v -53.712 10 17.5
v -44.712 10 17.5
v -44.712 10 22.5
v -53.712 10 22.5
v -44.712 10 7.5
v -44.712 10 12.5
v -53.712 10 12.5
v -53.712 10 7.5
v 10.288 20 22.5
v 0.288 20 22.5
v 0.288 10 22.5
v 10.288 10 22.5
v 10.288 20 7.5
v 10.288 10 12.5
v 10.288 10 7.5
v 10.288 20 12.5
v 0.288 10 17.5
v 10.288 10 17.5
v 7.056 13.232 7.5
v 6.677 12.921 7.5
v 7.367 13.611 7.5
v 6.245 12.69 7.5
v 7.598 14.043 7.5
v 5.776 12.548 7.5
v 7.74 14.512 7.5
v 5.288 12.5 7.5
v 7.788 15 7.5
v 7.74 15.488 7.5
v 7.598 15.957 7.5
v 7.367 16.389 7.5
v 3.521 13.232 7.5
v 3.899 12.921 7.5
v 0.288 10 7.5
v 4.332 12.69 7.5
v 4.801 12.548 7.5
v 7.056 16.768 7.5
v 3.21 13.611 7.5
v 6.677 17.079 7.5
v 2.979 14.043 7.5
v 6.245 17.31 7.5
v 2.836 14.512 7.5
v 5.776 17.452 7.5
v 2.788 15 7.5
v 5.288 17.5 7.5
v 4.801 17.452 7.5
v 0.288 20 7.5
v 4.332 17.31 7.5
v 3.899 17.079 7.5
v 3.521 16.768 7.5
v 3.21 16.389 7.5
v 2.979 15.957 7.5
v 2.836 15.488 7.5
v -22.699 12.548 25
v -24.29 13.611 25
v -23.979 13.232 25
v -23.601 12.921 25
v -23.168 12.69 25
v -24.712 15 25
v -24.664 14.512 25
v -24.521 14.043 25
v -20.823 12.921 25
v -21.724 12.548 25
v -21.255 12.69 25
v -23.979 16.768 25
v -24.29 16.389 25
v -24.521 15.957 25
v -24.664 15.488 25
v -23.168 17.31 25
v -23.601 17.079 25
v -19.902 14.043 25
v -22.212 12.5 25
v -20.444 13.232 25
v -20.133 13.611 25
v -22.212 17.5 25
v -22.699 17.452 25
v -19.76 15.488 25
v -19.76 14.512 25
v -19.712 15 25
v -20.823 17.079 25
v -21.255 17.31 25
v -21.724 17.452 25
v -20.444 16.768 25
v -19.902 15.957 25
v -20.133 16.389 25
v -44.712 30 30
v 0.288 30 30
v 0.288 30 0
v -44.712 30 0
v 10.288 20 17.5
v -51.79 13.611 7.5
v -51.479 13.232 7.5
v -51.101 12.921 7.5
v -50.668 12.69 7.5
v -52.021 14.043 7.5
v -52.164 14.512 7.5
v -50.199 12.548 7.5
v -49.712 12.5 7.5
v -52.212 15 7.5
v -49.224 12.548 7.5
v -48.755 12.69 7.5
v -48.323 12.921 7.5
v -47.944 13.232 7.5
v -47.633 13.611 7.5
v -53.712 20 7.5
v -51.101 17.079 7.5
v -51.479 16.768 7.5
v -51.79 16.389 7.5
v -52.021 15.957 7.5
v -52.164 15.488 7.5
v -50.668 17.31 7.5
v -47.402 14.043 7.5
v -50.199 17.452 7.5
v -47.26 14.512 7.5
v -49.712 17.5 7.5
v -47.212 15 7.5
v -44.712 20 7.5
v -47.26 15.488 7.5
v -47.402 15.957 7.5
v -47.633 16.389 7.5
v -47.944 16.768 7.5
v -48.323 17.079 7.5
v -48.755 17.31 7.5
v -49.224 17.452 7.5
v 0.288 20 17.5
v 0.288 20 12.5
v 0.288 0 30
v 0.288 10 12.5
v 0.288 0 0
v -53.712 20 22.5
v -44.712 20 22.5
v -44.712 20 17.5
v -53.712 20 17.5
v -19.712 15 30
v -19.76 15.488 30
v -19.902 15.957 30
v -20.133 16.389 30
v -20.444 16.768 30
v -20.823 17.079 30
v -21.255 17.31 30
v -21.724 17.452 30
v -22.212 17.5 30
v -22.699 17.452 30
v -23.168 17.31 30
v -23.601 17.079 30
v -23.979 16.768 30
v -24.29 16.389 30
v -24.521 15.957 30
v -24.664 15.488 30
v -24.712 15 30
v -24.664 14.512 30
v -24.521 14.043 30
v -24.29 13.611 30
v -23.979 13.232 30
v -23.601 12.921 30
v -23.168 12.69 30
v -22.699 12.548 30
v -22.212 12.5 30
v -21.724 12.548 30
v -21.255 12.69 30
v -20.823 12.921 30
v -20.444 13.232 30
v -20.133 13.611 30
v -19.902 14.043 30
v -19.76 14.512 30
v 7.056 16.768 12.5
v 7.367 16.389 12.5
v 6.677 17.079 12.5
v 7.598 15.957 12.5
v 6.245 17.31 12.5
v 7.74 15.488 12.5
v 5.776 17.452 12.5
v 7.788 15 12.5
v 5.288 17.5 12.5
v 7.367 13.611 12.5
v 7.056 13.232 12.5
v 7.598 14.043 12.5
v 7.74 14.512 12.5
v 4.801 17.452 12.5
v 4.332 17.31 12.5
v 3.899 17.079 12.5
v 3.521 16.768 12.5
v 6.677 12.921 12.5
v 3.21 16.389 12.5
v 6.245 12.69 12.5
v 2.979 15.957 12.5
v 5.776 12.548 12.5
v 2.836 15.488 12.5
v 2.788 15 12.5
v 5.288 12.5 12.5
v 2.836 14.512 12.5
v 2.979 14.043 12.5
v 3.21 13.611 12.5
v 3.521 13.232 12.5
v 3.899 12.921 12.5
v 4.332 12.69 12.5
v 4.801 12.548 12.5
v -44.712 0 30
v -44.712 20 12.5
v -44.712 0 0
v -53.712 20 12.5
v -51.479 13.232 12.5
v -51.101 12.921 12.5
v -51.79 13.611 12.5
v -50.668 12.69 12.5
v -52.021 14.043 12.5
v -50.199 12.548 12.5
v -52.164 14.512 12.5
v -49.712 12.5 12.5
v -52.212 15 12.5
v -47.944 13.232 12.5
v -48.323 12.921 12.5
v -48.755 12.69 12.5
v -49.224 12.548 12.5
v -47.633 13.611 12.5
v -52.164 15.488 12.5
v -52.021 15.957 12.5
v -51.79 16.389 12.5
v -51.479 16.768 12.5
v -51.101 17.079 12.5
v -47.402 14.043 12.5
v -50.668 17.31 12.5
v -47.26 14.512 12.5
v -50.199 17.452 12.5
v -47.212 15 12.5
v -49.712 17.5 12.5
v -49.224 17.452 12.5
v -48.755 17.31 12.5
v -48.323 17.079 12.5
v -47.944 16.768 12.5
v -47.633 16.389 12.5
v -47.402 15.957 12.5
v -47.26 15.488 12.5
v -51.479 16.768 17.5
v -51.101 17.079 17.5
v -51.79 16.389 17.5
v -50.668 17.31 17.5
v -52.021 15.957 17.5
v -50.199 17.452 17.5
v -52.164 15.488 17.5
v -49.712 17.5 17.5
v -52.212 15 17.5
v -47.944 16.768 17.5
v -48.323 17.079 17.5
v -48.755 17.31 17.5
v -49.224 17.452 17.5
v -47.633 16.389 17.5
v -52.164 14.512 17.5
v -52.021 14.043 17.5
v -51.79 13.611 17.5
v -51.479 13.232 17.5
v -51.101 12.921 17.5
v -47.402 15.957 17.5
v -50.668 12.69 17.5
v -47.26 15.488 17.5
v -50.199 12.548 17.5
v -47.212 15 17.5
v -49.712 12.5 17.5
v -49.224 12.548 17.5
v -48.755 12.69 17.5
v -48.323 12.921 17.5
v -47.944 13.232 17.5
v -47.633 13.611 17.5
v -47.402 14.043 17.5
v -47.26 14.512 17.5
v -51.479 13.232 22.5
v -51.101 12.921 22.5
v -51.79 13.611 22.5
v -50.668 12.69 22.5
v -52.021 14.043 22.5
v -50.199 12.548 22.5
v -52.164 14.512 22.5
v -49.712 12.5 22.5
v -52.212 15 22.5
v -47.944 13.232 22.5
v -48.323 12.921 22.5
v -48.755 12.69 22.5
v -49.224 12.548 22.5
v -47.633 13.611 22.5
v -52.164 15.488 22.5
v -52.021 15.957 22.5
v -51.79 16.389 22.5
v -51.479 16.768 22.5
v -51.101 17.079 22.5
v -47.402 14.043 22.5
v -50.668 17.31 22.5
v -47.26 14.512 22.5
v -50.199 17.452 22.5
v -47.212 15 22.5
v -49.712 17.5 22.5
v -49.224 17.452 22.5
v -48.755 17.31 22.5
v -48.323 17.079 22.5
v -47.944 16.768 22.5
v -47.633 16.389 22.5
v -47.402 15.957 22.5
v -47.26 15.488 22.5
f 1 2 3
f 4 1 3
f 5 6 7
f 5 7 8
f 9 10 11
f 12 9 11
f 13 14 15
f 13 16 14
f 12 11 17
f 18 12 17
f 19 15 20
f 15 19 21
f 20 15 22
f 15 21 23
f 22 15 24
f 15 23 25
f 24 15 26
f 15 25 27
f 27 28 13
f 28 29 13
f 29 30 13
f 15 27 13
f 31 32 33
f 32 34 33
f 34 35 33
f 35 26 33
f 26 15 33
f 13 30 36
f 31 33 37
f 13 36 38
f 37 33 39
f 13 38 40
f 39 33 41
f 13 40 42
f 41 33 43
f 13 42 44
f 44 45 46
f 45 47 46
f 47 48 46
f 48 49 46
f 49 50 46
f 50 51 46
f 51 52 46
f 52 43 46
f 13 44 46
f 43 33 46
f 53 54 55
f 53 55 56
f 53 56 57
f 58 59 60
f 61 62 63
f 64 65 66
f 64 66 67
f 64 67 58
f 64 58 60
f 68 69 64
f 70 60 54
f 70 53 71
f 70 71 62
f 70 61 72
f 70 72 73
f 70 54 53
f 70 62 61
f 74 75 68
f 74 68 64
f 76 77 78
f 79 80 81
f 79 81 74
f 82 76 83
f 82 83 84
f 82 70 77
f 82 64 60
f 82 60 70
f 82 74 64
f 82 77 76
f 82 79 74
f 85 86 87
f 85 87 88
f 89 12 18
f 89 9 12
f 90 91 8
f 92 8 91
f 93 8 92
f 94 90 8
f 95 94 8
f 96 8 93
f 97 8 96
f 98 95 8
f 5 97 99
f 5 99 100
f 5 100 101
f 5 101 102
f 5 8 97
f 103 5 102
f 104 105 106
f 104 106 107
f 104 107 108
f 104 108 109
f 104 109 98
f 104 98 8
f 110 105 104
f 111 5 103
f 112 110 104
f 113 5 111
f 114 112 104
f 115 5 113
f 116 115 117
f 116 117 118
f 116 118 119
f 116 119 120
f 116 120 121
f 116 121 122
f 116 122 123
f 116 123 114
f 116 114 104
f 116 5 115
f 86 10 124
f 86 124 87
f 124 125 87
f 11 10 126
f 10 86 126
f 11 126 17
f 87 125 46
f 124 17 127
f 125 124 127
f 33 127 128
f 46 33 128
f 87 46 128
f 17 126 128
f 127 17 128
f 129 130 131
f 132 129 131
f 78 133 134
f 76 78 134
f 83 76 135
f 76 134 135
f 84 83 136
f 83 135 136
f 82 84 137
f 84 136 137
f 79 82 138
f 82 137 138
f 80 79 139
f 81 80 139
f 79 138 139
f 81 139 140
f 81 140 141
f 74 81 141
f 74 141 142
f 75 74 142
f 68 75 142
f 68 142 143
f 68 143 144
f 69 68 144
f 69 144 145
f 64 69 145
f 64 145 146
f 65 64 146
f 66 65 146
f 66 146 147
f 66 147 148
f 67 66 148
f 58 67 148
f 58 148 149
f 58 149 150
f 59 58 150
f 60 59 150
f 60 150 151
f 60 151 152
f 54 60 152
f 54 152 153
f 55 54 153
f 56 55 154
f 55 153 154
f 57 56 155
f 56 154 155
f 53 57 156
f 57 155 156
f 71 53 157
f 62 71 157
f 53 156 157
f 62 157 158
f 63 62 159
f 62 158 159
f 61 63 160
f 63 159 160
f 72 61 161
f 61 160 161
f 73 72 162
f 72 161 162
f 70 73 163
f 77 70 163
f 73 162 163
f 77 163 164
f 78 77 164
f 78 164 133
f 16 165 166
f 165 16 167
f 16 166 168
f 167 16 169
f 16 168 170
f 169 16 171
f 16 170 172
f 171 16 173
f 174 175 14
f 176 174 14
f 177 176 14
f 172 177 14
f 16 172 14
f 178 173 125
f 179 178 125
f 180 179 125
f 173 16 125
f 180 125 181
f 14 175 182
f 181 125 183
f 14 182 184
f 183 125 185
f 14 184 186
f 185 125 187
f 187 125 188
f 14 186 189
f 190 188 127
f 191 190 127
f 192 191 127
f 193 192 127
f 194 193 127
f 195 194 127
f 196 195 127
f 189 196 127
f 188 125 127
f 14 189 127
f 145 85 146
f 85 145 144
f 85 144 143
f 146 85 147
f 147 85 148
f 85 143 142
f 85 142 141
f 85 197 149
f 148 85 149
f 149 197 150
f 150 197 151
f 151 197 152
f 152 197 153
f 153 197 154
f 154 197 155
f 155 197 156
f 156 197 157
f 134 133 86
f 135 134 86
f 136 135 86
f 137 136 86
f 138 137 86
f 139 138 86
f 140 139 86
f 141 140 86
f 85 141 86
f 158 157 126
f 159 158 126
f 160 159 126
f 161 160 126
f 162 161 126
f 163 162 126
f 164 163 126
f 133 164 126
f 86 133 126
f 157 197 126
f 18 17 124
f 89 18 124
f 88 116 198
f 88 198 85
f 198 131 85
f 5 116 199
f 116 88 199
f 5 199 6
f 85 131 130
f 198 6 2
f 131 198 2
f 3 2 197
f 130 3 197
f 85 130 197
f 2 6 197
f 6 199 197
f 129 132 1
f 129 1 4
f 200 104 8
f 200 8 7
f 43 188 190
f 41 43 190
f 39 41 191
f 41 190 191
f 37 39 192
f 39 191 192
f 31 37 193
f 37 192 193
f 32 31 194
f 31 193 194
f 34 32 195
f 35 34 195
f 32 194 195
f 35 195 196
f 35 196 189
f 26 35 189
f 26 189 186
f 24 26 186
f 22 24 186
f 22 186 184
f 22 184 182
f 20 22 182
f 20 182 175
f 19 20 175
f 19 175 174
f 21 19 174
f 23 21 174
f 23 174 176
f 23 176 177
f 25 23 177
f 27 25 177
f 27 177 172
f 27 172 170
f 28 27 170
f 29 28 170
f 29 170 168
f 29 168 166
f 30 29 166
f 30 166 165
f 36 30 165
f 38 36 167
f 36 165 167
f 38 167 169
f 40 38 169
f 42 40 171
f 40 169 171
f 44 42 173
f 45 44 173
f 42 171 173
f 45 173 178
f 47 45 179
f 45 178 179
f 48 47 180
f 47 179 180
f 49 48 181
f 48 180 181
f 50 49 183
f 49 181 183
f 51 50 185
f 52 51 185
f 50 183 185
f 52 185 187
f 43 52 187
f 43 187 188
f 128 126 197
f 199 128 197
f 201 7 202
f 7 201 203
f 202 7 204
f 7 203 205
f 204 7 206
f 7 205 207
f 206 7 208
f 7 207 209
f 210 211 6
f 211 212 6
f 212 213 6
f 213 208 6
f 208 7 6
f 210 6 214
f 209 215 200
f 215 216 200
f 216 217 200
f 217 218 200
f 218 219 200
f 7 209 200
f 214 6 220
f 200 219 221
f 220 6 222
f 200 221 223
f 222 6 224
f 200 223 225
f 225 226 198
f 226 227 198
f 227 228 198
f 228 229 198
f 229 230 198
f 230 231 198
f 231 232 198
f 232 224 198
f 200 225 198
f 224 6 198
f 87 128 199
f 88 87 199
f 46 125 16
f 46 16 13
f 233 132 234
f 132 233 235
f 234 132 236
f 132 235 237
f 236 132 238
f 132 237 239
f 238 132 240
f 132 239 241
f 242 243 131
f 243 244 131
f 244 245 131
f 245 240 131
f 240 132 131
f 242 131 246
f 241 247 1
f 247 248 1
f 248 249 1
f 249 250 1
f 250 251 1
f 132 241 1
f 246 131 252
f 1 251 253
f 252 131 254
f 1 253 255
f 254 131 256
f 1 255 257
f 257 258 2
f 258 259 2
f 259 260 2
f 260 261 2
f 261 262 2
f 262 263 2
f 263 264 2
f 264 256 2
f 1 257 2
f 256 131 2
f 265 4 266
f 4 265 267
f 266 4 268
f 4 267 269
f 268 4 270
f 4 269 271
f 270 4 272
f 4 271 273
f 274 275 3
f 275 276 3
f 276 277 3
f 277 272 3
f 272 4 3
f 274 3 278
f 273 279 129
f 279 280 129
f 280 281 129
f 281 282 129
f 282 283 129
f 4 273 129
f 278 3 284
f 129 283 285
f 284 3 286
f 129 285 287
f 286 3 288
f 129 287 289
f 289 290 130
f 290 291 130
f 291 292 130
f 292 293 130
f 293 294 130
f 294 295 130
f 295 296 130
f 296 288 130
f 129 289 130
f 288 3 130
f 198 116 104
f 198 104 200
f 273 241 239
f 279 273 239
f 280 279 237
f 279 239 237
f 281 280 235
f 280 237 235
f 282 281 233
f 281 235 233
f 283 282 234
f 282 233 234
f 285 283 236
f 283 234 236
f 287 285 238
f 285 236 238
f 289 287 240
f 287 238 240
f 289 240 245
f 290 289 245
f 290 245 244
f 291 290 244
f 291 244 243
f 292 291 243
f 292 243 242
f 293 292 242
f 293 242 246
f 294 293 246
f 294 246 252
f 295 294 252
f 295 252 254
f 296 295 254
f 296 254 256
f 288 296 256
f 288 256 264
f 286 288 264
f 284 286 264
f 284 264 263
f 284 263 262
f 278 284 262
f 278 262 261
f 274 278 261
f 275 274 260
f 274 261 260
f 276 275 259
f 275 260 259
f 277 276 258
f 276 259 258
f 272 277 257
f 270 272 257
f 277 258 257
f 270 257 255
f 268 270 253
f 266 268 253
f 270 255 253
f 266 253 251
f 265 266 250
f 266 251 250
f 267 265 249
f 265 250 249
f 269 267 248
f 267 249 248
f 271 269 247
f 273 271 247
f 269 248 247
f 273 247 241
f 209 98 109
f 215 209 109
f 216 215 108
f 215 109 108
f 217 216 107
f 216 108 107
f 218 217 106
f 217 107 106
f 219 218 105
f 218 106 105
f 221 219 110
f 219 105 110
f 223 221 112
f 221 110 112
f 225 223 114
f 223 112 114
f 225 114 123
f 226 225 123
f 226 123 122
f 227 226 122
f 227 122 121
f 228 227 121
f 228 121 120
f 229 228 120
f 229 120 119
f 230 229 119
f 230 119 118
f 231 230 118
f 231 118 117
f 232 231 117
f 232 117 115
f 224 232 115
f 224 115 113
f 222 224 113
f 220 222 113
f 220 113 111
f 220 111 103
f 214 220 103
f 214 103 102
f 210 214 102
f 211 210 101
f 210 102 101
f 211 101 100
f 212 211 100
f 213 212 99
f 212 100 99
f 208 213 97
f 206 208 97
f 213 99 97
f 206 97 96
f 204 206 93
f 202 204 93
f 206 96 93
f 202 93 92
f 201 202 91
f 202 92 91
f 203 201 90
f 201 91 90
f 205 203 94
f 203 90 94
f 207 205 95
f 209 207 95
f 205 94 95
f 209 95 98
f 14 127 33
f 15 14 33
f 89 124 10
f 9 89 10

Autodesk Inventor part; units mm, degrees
ref_plane "YZ Plane" through (0, 0, 0) normal (1, 0, 0) x (0, 1, 0)
ref_plane "XZ Plane" through (0, 0, 0) normal (0, 1, 0) x (-1, 0, 0)
ref_plane "XY Plane" through (0, 0, 0) normal (0, 0, 1) x (1, 0, 0)
sketch "Sketch1" plane through (0, 0, 0) normal (0, 1, 0) x (-1, 0, 0)
  line L0 (-0.2883, 0) -> (44.7117, 0)
  line L1 (44.7117, 0) -> (44.7117, 30)
  line L2 (44.7117, 30) -> (-0.2883, 30)
  line L3 (-0.2883, 30) -> (-0.2883, 0)
  point P0 (0, 0)
  dimension "d0" = 45
  dimension "d1" = 30
extrude "Extrusion1" add sketch "Sketch1" along normal blind 30
sketch "Sketch2" plane through (-44.7117, 0, 0) normal (-1, 0, 0) x (0, 0, 1)
  line L0 (19.294, 8.1716) -> (10.706, 21.8284) construction
  line L1 (10.706, 8.1716) -> (19.294, 21.8284) construction
  line L2 (17.5, 10) -> (12.5, 10)
  line L3 (12.5, 10) -> (12.5, 20)
  line L4 (12.5, 20) -> (17.5, 20)
  line L5 (17.5, 20) -> (17.5, 10)
  line L6 (17.5, 10) -> (12.5, 20) construction
  line L7 (12.5, 10) -> (17.5, 20) construction
  line L8 (12.5, 10) -> (7.5, 10)
  line L9 (7.5, 10) -> (7.5, 20)
  line L10 (7.5, 20) -> (12.5, 20)
  line L11 (12.5, 20) -> (12.5, 10)
  line L12 (17.5, 10) -> (22.5, 10)
  line L13 (22.5, 10) -> (22.5, 20)
  line L14 (22.5, 20) -> (17.5, 20)
  line L15 (17.5, 20) -> (17.5, 10)
  point P0 (0, 0)
  point P1 (15, 15)
  dimension "d4" = 5
  dimension "d5" = 10
  dimension "d6" = 5
  dimension "d7" = 5
extrude "Extrusion2" add sketch "Sketch2" along normal blind 9 contours L5 L14 L13 L12 | L8 L9 L10 L3
sketch "Sketch3" plane through (-44.7117, 10, 7.5) normal (0, 0, -1) x (-1, 0, 0)
  line L0 (0, -10) -> (0, 20) projected
  line L1 (0, 5) -> (5, 5)
  circle A0 centre (5, 5) radius 2.5
  point P0 (-44.7117, -10)
  dimension "d10" = 5
  dimension "d11" = 5
extrude "Extrusion3" cut sketch "Sketch3" against normal through all
sketch "Sketch4" plane through (0.2883, 0, 30) normal (1, 0, 0) x (0, 0, -1)
  line L0 (12.5, 10) -> (12.5, 20) projected
  line L1 (17.5, 10) -> (22.5, 10) projected
  line L2 (12.5, 20) -> (17.5, 20)
  line L3 (17.5, 20) -> (17.5, 10)
  line L4 (17.5, 10) -> (12.5, 10)
  line L5 (12.5, 10) -> (12.5, 20)
  line L6 (17.5, 20) -> (22.5, 20) projected
  line L7 (17.5, 10) -> (22.5, 10)
  line L8 (22.5, 10) -> (22.5, 20)
  line L9 (22.5, 20) -> (17.5, 20)
  line L10 (17.5, 20) -> (17.5, 10)
  line L11 (7.5, 10) -> (12.5, 10) projected
  line L12 (12.5, 20) -> (7.5, 20)
  line L13 (7.5, 20) -> (7.5, 10)
  line L14 (7.5, 10) -> (12.5, 10)
  line L15 (12.5, 10) -> (12.5, 20)
  point P0 (30, 0)
extrude "Extrusion4" add sketch "Sketch4" along normal blind 10 contours L11 L13 L12 L0 | L3 L6 L8 L1
sketch "Sketch5" plane through (0.2883, 10, 12.5) normal (0, 0, 1) x (-1, 0, 0)
  line L0 (0, 10) -> (0, -20) projected
  line L1 (0, -5) -> (-5, -5)
  circle A0 centre (-5, -5) radius 2.5
  point P0 (0.2883, 10)
  dimension "d16" = 5
  dimension "d17" = 5
extrude "Extrusion5" cut sketch "Sketch5" against normal through all
sketch "Sketch6" plane through (-44.7117, 0, 30) normal (0, 0, 1) x (1, 0, 0)
  circle A0 centre (22.5, 15) radius 2.5
  line L0 (0, 0) -> (0, 30) projected
  point P0 (44.7117, 0)
  point P1 (0, 15)
  dimension "d20" = 5
  dimension "d23" = 22.5
extrude "Extrusion6" cut sketch "Sketch6" against normal blind 5
